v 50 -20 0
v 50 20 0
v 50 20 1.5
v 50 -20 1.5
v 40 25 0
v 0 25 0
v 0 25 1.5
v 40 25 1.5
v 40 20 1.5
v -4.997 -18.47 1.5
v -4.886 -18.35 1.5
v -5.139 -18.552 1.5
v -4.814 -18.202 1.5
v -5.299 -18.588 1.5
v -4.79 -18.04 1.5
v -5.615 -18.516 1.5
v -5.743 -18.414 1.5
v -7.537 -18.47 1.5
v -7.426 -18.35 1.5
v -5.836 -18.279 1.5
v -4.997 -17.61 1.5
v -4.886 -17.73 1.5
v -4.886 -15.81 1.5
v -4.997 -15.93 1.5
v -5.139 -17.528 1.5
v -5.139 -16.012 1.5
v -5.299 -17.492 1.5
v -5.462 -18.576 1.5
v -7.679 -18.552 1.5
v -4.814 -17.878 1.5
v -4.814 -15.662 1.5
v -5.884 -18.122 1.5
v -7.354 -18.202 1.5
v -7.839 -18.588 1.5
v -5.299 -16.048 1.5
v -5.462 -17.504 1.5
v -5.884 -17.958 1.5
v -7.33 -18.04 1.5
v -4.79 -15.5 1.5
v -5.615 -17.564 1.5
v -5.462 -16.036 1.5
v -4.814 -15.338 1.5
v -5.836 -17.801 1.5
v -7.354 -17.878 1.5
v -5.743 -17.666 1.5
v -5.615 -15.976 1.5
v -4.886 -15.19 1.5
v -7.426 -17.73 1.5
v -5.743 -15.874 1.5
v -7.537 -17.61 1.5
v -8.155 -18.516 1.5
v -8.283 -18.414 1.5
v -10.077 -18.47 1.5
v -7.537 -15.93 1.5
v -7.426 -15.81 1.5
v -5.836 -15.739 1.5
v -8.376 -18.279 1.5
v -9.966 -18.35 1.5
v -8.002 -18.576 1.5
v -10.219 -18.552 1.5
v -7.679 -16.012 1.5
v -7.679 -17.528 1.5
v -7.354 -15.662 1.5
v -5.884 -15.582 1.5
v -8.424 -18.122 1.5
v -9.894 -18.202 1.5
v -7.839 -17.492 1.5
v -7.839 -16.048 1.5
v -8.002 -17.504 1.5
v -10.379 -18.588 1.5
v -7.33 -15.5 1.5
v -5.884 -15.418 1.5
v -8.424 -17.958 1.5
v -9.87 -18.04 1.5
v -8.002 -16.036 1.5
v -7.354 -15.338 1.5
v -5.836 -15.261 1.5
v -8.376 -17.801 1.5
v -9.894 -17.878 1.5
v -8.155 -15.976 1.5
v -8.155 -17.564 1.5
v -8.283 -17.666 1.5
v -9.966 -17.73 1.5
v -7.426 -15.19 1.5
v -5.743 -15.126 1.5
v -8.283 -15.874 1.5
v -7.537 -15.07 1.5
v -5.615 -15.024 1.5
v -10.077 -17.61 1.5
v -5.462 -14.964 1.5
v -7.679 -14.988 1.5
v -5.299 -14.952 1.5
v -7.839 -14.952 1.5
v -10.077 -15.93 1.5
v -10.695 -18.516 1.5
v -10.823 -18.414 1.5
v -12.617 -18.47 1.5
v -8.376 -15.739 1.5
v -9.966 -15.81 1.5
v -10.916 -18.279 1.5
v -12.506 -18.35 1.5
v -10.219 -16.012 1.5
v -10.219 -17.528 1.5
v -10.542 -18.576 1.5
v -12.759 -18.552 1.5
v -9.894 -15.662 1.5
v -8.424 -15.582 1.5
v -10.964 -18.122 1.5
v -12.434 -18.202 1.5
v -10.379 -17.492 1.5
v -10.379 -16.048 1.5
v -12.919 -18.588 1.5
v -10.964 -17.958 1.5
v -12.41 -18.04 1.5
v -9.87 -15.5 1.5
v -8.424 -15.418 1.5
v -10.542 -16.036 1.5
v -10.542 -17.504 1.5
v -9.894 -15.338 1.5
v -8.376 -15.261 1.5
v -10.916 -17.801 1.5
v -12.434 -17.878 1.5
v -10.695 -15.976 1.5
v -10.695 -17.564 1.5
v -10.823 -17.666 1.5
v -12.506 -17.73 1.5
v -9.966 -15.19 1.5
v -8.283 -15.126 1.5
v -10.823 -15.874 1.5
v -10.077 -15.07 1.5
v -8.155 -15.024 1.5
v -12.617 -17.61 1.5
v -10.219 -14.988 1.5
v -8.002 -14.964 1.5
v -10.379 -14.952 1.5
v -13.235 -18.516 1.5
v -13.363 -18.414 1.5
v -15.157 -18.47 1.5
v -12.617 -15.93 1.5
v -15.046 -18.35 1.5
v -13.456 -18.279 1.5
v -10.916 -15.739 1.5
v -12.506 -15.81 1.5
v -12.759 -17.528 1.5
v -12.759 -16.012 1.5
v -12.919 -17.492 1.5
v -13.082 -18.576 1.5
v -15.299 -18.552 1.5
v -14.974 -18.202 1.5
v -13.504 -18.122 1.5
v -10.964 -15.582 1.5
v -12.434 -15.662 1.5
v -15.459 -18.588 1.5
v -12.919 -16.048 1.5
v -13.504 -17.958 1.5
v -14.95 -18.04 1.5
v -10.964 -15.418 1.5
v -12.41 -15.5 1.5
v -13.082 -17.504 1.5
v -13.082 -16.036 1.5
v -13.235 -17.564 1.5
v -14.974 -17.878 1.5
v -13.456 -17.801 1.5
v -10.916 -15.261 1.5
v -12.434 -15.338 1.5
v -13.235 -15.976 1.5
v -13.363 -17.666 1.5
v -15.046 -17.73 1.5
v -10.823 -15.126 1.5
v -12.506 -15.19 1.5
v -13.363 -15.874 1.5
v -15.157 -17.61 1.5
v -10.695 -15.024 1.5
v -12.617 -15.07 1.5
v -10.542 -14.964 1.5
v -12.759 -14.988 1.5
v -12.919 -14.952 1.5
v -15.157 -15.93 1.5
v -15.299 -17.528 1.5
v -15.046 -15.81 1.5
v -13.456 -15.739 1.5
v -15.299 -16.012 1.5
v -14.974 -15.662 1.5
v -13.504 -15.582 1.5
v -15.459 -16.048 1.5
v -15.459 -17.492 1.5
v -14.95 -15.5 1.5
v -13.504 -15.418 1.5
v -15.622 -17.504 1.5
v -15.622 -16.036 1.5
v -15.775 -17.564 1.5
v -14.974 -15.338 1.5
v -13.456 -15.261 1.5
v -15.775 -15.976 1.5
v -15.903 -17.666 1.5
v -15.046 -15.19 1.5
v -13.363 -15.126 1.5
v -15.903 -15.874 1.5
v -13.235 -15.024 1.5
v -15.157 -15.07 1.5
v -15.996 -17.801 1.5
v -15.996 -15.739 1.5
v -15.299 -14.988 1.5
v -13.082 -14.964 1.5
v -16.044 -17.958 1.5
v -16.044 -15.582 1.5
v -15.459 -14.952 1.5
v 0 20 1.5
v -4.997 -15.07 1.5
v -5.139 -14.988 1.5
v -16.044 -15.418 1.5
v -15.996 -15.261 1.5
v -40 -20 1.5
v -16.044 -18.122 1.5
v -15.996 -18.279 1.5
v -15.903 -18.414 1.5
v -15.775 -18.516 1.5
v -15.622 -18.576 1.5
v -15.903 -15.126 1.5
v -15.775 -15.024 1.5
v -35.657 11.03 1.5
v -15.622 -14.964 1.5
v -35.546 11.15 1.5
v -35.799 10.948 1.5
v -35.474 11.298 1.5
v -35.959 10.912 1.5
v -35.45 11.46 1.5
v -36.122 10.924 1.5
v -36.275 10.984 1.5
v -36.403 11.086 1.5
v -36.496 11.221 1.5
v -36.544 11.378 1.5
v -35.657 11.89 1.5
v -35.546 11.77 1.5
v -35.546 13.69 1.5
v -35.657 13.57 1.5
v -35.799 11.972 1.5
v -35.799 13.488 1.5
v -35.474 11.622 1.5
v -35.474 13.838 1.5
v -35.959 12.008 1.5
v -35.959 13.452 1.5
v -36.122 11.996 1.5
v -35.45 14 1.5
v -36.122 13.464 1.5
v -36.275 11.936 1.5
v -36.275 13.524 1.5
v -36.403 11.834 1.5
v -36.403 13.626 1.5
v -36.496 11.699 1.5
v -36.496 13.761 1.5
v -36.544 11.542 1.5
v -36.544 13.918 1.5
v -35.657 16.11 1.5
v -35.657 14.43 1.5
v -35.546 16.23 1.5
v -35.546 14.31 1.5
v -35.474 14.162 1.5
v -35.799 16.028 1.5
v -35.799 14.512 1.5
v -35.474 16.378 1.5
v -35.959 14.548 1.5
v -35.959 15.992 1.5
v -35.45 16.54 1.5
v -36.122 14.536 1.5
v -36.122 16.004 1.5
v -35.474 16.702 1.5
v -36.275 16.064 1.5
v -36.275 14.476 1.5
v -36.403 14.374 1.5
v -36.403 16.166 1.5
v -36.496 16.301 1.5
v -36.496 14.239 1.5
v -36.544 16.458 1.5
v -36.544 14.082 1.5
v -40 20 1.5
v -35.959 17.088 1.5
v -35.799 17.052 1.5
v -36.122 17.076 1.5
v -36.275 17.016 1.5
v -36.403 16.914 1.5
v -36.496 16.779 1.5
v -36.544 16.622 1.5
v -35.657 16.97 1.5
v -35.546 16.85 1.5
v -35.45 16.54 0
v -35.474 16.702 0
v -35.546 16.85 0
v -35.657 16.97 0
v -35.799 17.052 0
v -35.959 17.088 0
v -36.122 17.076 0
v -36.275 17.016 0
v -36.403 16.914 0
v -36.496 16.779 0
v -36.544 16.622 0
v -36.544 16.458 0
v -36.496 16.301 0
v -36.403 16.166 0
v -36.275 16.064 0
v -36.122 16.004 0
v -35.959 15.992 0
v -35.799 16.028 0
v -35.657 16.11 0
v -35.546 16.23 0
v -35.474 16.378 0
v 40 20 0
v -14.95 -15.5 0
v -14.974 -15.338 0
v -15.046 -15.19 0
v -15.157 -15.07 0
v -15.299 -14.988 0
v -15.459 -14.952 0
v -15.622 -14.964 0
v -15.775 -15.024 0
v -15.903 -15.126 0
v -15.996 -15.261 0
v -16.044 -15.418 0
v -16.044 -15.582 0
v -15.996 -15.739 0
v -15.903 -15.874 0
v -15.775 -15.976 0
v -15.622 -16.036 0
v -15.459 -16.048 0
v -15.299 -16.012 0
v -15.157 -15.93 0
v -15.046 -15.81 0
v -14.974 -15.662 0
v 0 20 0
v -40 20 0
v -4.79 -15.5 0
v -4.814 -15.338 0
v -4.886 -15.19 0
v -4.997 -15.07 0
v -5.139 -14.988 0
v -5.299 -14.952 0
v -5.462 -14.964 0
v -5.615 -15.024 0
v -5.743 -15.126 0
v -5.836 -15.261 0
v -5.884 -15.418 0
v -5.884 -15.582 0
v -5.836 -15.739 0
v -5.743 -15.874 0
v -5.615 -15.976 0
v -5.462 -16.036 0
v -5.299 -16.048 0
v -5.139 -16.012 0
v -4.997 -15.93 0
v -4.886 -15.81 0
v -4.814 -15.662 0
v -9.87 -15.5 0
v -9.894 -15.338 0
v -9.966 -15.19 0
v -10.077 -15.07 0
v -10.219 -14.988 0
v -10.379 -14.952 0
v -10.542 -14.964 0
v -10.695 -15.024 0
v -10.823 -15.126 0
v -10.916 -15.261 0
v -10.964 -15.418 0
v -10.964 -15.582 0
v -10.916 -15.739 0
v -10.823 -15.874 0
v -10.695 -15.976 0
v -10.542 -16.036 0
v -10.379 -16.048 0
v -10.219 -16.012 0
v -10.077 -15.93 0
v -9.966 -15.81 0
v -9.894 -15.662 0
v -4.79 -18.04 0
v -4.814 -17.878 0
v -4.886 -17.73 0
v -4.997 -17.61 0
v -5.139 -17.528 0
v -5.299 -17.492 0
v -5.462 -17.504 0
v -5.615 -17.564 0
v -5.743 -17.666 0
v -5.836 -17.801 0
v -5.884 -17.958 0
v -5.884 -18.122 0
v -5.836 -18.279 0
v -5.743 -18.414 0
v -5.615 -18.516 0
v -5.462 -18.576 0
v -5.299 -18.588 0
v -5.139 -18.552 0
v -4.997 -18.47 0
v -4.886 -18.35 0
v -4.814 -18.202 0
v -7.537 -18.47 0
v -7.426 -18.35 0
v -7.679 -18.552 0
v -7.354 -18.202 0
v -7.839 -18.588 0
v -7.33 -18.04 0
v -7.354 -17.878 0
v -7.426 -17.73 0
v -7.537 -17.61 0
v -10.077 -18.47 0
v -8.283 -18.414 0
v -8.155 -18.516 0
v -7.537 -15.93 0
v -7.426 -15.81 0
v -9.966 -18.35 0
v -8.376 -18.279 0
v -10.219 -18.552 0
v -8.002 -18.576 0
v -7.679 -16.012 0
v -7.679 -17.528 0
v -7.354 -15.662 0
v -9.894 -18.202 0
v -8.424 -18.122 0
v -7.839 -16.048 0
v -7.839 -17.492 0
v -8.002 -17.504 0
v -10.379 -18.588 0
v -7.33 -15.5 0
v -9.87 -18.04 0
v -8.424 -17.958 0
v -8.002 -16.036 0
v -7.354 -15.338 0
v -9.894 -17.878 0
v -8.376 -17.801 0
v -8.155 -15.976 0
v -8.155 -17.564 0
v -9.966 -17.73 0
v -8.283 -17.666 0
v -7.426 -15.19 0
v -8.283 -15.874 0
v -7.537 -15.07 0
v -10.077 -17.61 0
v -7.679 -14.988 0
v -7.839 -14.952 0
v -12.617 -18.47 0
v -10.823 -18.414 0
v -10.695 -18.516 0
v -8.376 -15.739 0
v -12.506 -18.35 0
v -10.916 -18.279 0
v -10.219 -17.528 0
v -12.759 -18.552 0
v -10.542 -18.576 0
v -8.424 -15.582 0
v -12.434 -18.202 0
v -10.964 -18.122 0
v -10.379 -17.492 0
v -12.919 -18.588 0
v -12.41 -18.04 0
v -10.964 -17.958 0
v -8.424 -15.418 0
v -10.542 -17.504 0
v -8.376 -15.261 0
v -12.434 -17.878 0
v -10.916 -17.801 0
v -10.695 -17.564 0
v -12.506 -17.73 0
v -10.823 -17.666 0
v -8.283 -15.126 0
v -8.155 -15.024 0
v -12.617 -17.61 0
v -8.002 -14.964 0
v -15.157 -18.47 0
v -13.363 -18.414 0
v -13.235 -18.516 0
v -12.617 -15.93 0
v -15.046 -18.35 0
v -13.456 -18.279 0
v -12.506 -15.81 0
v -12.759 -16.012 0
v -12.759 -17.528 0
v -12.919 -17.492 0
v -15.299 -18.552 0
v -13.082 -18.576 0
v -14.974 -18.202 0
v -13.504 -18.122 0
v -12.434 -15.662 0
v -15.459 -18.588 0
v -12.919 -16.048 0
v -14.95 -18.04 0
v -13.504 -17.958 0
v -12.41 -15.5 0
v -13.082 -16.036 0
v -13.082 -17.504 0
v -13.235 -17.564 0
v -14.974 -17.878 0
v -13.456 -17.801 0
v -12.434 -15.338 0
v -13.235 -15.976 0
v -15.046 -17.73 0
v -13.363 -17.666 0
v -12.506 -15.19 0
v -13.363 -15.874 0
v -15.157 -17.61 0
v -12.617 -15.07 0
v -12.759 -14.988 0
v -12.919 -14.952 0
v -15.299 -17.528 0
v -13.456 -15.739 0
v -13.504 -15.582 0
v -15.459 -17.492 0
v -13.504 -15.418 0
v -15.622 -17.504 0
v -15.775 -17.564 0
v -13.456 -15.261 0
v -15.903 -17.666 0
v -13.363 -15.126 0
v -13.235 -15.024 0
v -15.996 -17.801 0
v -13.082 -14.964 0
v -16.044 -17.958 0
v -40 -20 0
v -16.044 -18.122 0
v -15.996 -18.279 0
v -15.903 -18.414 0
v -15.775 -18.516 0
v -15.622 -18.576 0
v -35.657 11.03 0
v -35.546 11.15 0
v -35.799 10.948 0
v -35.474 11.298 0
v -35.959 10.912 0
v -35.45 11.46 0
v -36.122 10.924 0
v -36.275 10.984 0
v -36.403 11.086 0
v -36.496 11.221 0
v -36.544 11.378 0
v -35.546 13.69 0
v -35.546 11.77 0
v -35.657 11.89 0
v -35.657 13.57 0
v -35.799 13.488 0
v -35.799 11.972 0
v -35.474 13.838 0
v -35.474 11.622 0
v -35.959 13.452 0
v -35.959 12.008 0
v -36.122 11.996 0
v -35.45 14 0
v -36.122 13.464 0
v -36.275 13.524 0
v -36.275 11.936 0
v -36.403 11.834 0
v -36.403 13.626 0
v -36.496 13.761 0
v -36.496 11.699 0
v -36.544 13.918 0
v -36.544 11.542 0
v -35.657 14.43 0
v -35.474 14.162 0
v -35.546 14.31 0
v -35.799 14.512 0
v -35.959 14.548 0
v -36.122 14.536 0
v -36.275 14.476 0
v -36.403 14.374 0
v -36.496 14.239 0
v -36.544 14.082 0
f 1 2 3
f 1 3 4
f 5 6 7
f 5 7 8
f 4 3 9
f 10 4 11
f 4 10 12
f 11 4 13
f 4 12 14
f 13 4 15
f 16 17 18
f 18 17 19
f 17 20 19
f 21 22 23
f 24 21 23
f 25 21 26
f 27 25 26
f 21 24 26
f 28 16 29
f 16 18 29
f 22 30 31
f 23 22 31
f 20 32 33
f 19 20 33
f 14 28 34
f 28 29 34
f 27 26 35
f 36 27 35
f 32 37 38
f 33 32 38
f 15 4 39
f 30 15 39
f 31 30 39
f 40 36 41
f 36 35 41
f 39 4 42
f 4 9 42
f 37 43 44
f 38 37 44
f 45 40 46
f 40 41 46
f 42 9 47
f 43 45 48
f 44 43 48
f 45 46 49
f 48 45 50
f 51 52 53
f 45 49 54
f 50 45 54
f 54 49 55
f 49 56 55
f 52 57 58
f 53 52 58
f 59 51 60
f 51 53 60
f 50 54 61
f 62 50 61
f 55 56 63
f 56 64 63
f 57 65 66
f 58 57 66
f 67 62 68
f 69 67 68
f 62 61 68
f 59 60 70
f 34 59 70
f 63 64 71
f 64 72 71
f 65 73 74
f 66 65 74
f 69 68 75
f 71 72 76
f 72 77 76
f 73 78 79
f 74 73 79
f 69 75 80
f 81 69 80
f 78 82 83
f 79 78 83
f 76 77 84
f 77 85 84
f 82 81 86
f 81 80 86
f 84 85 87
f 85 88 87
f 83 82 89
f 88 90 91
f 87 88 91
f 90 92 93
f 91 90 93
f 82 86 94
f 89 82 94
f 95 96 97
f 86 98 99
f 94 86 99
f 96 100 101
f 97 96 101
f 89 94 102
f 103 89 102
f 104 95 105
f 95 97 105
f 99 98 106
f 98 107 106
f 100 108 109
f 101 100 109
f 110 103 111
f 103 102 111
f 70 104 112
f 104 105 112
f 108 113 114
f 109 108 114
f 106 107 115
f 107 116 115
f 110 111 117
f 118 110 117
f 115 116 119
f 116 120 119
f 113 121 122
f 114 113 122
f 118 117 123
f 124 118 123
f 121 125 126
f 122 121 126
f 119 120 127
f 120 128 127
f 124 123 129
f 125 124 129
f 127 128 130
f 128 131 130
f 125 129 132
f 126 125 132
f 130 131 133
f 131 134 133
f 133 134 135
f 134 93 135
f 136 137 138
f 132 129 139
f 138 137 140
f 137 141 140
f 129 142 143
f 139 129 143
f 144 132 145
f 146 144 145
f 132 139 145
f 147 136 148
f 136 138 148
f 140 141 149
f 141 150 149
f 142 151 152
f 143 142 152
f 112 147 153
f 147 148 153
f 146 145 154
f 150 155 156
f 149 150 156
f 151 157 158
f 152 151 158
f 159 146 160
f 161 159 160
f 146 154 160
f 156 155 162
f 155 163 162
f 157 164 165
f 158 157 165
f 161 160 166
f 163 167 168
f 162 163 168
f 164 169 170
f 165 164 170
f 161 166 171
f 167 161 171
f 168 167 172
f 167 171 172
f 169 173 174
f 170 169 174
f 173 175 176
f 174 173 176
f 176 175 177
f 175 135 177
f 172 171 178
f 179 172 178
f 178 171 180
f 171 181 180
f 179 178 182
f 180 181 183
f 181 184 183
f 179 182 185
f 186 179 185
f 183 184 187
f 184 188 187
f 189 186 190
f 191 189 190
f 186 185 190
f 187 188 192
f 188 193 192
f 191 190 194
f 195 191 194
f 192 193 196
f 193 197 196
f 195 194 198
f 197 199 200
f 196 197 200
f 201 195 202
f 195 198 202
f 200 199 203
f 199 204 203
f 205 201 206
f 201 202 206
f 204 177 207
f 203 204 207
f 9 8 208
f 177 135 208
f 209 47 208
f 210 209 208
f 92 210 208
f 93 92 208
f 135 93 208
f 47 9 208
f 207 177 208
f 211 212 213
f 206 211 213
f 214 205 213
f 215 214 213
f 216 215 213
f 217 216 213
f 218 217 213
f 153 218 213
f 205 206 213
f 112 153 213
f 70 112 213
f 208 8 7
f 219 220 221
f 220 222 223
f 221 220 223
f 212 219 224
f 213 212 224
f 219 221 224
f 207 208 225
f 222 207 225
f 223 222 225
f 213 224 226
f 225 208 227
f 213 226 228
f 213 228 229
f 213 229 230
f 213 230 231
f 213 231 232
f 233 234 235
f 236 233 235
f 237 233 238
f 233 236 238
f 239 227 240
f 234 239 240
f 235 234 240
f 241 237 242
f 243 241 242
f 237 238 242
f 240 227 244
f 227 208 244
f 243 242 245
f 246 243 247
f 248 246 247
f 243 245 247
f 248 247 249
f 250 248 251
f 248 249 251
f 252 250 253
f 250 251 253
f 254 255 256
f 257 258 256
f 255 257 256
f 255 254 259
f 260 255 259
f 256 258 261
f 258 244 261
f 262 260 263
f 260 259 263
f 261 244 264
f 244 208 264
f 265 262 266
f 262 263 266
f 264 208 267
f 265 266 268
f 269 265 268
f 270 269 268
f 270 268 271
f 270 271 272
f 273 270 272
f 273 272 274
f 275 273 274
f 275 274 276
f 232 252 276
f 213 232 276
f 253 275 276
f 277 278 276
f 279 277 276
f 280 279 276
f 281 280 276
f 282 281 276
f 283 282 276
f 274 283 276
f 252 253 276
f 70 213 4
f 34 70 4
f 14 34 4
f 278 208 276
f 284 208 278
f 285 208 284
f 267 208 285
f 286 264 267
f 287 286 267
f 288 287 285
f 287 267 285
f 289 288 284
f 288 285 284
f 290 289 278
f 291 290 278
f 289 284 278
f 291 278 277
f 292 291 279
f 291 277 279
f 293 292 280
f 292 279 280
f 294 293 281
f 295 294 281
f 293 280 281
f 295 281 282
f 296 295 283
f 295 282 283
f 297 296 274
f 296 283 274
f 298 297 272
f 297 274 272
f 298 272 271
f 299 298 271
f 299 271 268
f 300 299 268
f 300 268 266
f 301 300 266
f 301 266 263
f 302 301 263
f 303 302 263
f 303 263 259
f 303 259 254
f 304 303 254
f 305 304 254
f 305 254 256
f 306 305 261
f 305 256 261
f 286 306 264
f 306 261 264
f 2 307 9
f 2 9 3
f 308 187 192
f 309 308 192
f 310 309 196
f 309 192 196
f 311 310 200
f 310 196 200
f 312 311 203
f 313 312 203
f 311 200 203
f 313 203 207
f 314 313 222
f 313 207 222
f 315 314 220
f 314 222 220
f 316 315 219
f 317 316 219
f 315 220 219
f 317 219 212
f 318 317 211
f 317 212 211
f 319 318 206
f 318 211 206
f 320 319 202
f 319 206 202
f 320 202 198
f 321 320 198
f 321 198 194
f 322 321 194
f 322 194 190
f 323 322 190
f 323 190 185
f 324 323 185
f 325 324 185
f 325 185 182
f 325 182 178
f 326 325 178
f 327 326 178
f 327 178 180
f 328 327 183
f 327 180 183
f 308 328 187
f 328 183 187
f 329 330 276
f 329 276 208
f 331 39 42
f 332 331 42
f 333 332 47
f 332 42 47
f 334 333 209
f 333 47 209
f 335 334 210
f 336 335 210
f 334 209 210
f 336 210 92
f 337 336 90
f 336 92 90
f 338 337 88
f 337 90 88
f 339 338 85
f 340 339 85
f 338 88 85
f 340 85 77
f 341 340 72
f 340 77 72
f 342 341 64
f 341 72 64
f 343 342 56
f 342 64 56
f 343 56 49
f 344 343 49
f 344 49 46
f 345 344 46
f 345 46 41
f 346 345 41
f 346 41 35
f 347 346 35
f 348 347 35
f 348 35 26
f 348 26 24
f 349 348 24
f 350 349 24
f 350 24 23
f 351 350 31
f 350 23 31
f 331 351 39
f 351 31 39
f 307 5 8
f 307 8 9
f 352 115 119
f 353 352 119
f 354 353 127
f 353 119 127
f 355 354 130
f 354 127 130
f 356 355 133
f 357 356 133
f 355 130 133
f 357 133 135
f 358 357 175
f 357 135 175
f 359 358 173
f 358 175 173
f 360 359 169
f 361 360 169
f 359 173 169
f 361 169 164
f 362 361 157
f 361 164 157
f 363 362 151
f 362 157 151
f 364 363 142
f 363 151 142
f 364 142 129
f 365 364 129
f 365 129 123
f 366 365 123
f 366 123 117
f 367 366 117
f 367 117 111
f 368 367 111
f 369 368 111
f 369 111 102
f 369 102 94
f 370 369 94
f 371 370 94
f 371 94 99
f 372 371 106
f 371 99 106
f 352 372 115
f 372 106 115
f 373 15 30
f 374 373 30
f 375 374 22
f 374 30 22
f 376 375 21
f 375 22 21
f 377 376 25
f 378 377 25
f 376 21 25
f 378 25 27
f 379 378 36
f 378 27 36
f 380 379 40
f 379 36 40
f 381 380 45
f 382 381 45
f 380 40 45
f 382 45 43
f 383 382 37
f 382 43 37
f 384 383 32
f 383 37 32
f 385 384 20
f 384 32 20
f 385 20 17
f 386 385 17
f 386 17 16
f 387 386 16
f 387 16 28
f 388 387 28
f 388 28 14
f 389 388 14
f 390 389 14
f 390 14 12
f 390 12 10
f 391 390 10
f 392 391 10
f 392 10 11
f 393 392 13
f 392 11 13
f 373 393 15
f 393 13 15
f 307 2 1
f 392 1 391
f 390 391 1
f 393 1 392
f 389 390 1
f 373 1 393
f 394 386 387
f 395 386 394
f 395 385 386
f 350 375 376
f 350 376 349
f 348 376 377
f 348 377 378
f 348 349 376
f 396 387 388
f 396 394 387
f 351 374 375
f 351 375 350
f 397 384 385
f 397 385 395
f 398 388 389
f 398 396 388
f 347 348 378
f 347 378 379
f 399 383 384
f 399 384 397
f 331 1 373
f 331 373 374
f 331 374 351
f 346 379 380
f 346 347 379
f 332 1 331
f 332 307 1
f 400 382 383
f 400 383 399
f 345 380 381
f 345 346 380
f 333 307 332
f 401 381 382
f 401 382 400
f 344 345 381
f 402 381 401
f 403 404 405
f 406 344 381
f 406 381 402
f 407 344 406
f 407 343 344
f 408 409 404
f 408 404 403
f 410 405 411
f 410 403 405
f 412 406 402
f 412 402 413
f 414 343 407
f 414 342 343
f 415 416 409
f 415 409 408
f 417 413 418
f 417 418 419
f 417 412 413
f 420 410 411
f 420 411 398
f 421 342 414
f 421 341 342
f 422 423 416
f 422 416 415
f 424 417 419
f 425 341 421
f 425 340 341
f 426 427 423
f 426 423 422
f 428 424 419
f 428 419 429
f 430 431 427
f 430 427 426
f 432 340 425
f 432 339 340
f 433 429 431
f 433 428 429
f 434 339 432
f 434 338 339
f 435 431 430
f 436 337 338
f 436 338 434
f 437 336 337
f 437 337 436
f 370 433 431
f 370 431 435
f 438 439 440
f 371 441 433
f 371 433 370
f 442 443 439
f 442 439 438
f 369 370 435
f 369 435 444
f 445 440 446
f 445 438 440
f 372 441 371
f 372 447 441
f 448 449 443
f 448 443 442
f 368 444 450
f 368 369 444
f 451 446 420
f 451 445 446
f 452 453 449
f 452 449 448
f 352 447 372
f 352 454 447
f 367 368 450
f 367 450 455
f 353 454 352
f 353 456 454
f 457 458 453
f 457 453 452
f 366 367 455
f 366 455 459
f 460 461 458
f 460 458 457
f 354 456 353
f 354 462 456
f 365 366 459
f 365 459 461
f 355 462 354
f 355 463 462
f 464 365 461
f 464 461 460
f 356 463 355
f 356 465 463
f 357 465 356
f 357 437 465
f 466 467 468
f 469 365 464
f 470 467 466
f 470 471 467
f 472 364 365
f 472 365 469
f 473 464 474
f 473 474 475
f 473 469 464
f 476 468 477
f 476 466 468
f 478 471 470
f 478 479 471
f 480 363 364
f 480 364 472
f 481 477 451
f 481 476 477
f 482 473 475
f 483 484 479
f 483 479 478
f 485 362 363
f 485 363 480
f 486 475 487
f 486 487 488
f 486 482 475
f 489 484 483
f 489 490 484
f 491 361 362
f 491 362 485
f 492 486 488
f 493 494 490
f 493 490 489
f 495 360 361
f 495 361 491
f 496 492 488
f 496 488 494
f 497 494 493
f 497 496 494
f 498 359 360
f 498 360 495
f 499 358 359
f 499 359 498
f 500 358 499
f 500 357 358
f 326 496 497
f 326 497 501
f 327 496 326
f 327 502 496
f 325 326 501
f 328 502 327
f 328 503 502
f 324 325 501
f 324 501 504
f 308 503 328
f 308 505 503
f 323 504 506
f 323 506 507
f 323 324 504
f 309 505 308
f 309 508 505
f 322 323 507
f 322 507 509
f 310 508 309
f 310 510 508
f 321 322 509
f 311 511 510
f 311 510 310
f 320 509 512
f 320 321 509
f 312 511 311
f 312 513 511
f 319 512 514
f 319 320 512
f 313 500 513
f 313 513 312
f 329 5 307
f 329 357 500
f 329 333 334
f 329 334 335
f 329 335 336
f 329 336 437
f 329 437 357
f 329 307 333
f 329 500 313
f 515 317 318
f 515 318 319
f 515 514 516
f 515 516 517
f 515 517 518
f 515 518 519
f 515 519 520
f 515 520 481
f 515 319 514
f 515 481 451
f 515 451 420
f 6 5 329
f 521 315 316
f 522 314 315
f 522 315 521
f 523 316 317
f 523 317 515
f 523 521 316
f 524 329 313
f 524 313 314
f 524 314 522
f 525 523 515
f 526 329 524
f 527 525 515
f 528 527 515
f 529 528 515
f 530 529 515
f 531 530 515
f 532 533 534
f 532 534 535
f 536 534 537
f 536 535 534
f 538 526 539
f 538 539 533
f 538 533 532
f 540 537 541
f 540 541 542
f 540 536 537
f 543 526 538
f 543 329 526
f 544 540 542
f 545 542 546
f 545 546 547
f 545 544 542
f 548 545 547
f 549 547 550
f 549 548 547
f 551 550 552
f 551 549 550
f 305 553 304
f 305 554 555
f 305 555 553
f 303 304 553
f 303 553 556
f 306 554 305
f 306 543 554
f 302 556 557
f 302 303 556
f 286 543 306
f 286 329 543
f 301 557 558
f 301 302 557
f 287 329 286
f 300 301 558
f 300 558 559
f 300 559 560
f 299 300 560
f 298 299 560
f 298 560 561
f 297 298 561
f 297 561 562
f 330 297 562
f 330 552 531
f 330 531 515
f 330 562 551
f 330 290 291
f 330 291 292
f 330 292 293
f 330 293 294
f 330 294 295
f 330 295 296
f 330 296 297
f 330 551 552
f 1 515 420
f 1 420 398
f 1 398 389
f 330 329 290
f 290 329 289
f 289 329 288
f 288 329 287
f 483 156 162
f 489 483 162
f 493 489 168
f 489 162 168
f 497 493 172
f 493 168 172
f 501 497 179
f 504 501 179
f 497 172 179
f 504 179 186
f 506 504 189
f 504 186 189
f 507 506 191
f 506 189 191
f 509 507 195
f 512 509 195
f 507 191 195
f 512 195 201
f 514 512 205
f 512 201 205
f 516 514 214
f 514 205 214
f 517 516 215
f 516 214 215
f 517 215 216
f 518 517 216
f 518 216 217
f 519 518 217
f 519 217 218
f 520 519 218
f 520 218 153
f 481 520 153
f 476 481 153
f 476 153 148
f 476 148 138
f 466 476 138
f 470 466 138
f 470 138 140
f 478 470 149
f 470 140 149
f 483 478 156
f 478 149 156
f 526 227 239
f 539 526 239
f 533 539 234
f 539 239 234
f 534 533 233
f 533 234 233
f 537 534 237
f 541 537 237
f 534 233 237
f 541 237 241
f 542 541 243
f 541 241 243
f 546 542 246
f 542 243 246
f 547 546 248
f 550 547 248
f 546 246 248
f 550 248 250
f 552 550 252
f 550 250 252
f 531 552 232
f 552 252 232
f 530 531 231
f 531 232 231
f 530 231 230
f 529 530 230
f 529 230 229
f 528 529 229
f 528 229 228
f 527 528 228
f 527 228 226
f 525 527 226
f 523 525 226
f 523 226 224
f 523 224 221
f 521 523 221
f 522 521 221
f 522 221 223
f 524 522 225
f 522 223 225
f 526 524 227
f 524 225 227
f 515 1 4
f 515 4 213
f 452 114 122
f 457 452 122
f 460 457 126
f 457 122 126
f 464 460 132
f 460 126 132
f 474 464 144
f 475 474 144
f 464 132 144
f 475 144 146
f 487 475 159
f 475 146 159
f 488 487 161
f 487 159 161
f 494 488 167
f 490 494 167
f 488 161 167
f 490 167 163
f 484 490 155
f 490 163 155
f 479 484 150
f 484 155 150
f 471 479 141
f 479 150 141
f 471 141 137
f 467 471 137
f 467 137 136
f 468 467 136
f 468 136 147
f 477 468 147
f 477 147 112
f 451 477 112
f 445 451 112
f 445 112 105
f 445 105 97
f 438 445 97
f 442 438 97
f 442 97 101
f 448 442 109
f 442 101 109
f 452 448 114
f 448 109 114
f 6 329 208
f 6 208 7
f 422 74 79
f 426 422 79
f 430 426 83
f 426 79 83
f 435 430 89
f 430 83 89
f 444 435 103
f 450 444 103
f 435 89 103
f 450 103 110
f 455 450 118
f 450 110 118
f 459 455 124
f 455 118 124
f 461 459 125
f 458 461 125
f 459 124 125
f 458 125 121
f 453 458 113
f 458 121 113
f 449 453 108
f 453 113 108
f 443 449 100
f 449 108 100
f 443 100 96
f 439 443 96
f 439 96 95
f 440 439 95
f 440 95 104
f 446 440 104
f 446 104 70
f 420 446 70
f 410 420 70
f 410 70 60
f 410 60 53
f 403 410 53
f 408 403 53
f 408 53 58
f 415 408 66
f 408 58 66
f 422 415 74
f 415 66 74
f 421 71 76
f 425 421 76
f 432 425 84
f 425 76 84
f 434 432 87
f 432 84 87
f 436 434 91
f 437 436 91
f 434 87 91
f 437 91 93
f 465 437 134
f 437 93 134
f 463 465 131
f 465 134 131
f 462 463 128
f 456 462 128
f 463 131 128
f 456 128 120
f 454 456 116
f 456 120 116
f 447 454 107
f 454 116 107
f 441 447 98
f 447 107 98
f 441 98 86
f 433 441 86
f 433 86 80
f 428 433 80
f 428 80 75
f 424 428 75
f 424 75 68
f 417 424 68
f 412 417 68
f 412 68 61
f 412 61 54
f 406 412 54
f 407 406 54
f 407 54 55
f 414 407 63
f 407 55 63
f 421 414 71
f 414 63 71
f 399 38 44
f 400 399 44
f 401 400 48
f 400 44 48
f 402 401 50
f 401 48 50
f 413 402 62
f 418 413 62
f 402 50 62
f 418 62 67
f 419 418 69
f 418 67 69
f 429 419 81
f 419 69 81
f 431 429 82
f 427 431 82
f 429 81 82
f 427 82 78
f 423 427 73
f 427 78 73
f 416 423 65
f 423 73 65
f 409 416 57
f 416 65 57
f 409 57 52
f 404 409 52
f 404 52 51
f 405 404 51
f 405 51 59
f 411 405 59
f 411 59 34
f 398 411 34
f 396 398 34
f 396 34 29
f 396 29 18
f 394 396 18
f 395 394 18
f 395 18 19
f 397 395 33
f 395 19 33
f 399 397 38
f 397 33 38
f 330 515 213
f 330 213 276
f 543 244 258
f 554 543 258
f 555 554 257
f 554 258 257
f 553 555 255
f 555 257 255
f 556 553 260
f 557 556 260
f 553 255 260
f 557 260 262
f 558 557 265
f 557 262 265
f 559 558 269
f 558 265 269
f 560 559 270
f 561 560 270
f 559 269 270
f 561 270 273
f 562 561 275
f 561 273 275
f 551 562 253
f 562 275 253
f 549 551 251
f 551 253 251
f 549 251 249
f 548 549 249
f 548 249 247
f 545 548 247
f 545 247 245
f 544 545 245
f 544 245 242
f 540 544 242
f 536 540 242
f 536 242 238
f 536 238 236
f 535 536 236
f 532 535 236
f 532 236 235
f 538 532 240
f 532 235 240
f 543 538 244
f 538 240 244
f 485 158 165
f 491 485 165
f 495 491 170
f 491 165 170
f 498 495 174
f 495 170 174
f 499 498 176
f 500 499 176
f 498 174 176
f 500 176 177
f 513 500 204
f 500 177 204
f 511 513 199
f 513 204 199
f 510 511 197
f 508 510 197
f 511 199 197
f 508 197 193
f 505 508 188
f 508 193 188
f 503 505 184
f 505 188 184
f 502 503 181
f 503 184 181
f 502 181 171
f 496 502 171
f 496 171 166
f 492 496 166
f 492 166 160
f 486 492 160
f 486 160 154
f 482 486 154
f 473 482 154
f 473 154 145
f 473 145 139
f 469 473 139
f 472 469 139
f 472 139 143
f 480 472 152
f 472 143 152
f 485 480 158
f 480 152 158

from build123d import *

# Parameters (mm, degrees)
EXTRUDE_1_DEPTH     = 1.5
SKETCH_2_R          = 0.55
CUT_EXTRUDE_1_DEPTH = 1.5


with BuildPart() as part:
    # Эскиз1 → Вытянуть1 (new body)
    with BuildSketch(Plane.XY):
        Polygon((0, 20), (0, 25), (40, 25), (40, 20), (50, 20), (50, -20), (-40, -20), (-40, 20), align=None)
    extrude(amount=EXTRUDE_1_DEPTH)

    # Эскиз2 → Вырез-Вытянуть1 (cut)
    with BuildSketch(Plane.XY.offset(1.5)):
        with Locations((-36, 16.54)):
            Circle(SKETCH_2_R)
        with Locations((-36, 11.46)):
            Circle(SKETCH_2_R)
        with Locations((-36, 14)):
            Circle(SKETCH_2_R)
        with Locations((-15.5, -15.5)):
            Circle(SKETCH_2_R)
        with Locations((-15.5, -18.04)):
            Circle(SKETCH_2_R)
        with Locations((-12.96, -15.5)):
            Circle(SKETCH_2_R)
        with Locations((-12.96, -18.04)):
            Circle(SKETCH_2_R)
        with Locations((-10.42, -15.5)):
            Circle(SKETCH_2_R)
        with Locations((-10.42, -18.04)):
            Circle(SKETCH_2_R)
        with Locations((-7.88, -15.5)):
            Circle(SKETCH_2_R)
        with Locations((-7.88, -18.04)):
            Circle(SKETCH_2_R)
        with Locations((-5.34, -15.5)):
            Circle(SKETCH_2_R)
        with Locations((-5.34, -18.04)):
            Circle(SKETCH_2_R)
    extrude(amount=-CUT_EXTRUDE_1_DEPTH, mode=Mode.SUBTRACT)


solid = part.part
